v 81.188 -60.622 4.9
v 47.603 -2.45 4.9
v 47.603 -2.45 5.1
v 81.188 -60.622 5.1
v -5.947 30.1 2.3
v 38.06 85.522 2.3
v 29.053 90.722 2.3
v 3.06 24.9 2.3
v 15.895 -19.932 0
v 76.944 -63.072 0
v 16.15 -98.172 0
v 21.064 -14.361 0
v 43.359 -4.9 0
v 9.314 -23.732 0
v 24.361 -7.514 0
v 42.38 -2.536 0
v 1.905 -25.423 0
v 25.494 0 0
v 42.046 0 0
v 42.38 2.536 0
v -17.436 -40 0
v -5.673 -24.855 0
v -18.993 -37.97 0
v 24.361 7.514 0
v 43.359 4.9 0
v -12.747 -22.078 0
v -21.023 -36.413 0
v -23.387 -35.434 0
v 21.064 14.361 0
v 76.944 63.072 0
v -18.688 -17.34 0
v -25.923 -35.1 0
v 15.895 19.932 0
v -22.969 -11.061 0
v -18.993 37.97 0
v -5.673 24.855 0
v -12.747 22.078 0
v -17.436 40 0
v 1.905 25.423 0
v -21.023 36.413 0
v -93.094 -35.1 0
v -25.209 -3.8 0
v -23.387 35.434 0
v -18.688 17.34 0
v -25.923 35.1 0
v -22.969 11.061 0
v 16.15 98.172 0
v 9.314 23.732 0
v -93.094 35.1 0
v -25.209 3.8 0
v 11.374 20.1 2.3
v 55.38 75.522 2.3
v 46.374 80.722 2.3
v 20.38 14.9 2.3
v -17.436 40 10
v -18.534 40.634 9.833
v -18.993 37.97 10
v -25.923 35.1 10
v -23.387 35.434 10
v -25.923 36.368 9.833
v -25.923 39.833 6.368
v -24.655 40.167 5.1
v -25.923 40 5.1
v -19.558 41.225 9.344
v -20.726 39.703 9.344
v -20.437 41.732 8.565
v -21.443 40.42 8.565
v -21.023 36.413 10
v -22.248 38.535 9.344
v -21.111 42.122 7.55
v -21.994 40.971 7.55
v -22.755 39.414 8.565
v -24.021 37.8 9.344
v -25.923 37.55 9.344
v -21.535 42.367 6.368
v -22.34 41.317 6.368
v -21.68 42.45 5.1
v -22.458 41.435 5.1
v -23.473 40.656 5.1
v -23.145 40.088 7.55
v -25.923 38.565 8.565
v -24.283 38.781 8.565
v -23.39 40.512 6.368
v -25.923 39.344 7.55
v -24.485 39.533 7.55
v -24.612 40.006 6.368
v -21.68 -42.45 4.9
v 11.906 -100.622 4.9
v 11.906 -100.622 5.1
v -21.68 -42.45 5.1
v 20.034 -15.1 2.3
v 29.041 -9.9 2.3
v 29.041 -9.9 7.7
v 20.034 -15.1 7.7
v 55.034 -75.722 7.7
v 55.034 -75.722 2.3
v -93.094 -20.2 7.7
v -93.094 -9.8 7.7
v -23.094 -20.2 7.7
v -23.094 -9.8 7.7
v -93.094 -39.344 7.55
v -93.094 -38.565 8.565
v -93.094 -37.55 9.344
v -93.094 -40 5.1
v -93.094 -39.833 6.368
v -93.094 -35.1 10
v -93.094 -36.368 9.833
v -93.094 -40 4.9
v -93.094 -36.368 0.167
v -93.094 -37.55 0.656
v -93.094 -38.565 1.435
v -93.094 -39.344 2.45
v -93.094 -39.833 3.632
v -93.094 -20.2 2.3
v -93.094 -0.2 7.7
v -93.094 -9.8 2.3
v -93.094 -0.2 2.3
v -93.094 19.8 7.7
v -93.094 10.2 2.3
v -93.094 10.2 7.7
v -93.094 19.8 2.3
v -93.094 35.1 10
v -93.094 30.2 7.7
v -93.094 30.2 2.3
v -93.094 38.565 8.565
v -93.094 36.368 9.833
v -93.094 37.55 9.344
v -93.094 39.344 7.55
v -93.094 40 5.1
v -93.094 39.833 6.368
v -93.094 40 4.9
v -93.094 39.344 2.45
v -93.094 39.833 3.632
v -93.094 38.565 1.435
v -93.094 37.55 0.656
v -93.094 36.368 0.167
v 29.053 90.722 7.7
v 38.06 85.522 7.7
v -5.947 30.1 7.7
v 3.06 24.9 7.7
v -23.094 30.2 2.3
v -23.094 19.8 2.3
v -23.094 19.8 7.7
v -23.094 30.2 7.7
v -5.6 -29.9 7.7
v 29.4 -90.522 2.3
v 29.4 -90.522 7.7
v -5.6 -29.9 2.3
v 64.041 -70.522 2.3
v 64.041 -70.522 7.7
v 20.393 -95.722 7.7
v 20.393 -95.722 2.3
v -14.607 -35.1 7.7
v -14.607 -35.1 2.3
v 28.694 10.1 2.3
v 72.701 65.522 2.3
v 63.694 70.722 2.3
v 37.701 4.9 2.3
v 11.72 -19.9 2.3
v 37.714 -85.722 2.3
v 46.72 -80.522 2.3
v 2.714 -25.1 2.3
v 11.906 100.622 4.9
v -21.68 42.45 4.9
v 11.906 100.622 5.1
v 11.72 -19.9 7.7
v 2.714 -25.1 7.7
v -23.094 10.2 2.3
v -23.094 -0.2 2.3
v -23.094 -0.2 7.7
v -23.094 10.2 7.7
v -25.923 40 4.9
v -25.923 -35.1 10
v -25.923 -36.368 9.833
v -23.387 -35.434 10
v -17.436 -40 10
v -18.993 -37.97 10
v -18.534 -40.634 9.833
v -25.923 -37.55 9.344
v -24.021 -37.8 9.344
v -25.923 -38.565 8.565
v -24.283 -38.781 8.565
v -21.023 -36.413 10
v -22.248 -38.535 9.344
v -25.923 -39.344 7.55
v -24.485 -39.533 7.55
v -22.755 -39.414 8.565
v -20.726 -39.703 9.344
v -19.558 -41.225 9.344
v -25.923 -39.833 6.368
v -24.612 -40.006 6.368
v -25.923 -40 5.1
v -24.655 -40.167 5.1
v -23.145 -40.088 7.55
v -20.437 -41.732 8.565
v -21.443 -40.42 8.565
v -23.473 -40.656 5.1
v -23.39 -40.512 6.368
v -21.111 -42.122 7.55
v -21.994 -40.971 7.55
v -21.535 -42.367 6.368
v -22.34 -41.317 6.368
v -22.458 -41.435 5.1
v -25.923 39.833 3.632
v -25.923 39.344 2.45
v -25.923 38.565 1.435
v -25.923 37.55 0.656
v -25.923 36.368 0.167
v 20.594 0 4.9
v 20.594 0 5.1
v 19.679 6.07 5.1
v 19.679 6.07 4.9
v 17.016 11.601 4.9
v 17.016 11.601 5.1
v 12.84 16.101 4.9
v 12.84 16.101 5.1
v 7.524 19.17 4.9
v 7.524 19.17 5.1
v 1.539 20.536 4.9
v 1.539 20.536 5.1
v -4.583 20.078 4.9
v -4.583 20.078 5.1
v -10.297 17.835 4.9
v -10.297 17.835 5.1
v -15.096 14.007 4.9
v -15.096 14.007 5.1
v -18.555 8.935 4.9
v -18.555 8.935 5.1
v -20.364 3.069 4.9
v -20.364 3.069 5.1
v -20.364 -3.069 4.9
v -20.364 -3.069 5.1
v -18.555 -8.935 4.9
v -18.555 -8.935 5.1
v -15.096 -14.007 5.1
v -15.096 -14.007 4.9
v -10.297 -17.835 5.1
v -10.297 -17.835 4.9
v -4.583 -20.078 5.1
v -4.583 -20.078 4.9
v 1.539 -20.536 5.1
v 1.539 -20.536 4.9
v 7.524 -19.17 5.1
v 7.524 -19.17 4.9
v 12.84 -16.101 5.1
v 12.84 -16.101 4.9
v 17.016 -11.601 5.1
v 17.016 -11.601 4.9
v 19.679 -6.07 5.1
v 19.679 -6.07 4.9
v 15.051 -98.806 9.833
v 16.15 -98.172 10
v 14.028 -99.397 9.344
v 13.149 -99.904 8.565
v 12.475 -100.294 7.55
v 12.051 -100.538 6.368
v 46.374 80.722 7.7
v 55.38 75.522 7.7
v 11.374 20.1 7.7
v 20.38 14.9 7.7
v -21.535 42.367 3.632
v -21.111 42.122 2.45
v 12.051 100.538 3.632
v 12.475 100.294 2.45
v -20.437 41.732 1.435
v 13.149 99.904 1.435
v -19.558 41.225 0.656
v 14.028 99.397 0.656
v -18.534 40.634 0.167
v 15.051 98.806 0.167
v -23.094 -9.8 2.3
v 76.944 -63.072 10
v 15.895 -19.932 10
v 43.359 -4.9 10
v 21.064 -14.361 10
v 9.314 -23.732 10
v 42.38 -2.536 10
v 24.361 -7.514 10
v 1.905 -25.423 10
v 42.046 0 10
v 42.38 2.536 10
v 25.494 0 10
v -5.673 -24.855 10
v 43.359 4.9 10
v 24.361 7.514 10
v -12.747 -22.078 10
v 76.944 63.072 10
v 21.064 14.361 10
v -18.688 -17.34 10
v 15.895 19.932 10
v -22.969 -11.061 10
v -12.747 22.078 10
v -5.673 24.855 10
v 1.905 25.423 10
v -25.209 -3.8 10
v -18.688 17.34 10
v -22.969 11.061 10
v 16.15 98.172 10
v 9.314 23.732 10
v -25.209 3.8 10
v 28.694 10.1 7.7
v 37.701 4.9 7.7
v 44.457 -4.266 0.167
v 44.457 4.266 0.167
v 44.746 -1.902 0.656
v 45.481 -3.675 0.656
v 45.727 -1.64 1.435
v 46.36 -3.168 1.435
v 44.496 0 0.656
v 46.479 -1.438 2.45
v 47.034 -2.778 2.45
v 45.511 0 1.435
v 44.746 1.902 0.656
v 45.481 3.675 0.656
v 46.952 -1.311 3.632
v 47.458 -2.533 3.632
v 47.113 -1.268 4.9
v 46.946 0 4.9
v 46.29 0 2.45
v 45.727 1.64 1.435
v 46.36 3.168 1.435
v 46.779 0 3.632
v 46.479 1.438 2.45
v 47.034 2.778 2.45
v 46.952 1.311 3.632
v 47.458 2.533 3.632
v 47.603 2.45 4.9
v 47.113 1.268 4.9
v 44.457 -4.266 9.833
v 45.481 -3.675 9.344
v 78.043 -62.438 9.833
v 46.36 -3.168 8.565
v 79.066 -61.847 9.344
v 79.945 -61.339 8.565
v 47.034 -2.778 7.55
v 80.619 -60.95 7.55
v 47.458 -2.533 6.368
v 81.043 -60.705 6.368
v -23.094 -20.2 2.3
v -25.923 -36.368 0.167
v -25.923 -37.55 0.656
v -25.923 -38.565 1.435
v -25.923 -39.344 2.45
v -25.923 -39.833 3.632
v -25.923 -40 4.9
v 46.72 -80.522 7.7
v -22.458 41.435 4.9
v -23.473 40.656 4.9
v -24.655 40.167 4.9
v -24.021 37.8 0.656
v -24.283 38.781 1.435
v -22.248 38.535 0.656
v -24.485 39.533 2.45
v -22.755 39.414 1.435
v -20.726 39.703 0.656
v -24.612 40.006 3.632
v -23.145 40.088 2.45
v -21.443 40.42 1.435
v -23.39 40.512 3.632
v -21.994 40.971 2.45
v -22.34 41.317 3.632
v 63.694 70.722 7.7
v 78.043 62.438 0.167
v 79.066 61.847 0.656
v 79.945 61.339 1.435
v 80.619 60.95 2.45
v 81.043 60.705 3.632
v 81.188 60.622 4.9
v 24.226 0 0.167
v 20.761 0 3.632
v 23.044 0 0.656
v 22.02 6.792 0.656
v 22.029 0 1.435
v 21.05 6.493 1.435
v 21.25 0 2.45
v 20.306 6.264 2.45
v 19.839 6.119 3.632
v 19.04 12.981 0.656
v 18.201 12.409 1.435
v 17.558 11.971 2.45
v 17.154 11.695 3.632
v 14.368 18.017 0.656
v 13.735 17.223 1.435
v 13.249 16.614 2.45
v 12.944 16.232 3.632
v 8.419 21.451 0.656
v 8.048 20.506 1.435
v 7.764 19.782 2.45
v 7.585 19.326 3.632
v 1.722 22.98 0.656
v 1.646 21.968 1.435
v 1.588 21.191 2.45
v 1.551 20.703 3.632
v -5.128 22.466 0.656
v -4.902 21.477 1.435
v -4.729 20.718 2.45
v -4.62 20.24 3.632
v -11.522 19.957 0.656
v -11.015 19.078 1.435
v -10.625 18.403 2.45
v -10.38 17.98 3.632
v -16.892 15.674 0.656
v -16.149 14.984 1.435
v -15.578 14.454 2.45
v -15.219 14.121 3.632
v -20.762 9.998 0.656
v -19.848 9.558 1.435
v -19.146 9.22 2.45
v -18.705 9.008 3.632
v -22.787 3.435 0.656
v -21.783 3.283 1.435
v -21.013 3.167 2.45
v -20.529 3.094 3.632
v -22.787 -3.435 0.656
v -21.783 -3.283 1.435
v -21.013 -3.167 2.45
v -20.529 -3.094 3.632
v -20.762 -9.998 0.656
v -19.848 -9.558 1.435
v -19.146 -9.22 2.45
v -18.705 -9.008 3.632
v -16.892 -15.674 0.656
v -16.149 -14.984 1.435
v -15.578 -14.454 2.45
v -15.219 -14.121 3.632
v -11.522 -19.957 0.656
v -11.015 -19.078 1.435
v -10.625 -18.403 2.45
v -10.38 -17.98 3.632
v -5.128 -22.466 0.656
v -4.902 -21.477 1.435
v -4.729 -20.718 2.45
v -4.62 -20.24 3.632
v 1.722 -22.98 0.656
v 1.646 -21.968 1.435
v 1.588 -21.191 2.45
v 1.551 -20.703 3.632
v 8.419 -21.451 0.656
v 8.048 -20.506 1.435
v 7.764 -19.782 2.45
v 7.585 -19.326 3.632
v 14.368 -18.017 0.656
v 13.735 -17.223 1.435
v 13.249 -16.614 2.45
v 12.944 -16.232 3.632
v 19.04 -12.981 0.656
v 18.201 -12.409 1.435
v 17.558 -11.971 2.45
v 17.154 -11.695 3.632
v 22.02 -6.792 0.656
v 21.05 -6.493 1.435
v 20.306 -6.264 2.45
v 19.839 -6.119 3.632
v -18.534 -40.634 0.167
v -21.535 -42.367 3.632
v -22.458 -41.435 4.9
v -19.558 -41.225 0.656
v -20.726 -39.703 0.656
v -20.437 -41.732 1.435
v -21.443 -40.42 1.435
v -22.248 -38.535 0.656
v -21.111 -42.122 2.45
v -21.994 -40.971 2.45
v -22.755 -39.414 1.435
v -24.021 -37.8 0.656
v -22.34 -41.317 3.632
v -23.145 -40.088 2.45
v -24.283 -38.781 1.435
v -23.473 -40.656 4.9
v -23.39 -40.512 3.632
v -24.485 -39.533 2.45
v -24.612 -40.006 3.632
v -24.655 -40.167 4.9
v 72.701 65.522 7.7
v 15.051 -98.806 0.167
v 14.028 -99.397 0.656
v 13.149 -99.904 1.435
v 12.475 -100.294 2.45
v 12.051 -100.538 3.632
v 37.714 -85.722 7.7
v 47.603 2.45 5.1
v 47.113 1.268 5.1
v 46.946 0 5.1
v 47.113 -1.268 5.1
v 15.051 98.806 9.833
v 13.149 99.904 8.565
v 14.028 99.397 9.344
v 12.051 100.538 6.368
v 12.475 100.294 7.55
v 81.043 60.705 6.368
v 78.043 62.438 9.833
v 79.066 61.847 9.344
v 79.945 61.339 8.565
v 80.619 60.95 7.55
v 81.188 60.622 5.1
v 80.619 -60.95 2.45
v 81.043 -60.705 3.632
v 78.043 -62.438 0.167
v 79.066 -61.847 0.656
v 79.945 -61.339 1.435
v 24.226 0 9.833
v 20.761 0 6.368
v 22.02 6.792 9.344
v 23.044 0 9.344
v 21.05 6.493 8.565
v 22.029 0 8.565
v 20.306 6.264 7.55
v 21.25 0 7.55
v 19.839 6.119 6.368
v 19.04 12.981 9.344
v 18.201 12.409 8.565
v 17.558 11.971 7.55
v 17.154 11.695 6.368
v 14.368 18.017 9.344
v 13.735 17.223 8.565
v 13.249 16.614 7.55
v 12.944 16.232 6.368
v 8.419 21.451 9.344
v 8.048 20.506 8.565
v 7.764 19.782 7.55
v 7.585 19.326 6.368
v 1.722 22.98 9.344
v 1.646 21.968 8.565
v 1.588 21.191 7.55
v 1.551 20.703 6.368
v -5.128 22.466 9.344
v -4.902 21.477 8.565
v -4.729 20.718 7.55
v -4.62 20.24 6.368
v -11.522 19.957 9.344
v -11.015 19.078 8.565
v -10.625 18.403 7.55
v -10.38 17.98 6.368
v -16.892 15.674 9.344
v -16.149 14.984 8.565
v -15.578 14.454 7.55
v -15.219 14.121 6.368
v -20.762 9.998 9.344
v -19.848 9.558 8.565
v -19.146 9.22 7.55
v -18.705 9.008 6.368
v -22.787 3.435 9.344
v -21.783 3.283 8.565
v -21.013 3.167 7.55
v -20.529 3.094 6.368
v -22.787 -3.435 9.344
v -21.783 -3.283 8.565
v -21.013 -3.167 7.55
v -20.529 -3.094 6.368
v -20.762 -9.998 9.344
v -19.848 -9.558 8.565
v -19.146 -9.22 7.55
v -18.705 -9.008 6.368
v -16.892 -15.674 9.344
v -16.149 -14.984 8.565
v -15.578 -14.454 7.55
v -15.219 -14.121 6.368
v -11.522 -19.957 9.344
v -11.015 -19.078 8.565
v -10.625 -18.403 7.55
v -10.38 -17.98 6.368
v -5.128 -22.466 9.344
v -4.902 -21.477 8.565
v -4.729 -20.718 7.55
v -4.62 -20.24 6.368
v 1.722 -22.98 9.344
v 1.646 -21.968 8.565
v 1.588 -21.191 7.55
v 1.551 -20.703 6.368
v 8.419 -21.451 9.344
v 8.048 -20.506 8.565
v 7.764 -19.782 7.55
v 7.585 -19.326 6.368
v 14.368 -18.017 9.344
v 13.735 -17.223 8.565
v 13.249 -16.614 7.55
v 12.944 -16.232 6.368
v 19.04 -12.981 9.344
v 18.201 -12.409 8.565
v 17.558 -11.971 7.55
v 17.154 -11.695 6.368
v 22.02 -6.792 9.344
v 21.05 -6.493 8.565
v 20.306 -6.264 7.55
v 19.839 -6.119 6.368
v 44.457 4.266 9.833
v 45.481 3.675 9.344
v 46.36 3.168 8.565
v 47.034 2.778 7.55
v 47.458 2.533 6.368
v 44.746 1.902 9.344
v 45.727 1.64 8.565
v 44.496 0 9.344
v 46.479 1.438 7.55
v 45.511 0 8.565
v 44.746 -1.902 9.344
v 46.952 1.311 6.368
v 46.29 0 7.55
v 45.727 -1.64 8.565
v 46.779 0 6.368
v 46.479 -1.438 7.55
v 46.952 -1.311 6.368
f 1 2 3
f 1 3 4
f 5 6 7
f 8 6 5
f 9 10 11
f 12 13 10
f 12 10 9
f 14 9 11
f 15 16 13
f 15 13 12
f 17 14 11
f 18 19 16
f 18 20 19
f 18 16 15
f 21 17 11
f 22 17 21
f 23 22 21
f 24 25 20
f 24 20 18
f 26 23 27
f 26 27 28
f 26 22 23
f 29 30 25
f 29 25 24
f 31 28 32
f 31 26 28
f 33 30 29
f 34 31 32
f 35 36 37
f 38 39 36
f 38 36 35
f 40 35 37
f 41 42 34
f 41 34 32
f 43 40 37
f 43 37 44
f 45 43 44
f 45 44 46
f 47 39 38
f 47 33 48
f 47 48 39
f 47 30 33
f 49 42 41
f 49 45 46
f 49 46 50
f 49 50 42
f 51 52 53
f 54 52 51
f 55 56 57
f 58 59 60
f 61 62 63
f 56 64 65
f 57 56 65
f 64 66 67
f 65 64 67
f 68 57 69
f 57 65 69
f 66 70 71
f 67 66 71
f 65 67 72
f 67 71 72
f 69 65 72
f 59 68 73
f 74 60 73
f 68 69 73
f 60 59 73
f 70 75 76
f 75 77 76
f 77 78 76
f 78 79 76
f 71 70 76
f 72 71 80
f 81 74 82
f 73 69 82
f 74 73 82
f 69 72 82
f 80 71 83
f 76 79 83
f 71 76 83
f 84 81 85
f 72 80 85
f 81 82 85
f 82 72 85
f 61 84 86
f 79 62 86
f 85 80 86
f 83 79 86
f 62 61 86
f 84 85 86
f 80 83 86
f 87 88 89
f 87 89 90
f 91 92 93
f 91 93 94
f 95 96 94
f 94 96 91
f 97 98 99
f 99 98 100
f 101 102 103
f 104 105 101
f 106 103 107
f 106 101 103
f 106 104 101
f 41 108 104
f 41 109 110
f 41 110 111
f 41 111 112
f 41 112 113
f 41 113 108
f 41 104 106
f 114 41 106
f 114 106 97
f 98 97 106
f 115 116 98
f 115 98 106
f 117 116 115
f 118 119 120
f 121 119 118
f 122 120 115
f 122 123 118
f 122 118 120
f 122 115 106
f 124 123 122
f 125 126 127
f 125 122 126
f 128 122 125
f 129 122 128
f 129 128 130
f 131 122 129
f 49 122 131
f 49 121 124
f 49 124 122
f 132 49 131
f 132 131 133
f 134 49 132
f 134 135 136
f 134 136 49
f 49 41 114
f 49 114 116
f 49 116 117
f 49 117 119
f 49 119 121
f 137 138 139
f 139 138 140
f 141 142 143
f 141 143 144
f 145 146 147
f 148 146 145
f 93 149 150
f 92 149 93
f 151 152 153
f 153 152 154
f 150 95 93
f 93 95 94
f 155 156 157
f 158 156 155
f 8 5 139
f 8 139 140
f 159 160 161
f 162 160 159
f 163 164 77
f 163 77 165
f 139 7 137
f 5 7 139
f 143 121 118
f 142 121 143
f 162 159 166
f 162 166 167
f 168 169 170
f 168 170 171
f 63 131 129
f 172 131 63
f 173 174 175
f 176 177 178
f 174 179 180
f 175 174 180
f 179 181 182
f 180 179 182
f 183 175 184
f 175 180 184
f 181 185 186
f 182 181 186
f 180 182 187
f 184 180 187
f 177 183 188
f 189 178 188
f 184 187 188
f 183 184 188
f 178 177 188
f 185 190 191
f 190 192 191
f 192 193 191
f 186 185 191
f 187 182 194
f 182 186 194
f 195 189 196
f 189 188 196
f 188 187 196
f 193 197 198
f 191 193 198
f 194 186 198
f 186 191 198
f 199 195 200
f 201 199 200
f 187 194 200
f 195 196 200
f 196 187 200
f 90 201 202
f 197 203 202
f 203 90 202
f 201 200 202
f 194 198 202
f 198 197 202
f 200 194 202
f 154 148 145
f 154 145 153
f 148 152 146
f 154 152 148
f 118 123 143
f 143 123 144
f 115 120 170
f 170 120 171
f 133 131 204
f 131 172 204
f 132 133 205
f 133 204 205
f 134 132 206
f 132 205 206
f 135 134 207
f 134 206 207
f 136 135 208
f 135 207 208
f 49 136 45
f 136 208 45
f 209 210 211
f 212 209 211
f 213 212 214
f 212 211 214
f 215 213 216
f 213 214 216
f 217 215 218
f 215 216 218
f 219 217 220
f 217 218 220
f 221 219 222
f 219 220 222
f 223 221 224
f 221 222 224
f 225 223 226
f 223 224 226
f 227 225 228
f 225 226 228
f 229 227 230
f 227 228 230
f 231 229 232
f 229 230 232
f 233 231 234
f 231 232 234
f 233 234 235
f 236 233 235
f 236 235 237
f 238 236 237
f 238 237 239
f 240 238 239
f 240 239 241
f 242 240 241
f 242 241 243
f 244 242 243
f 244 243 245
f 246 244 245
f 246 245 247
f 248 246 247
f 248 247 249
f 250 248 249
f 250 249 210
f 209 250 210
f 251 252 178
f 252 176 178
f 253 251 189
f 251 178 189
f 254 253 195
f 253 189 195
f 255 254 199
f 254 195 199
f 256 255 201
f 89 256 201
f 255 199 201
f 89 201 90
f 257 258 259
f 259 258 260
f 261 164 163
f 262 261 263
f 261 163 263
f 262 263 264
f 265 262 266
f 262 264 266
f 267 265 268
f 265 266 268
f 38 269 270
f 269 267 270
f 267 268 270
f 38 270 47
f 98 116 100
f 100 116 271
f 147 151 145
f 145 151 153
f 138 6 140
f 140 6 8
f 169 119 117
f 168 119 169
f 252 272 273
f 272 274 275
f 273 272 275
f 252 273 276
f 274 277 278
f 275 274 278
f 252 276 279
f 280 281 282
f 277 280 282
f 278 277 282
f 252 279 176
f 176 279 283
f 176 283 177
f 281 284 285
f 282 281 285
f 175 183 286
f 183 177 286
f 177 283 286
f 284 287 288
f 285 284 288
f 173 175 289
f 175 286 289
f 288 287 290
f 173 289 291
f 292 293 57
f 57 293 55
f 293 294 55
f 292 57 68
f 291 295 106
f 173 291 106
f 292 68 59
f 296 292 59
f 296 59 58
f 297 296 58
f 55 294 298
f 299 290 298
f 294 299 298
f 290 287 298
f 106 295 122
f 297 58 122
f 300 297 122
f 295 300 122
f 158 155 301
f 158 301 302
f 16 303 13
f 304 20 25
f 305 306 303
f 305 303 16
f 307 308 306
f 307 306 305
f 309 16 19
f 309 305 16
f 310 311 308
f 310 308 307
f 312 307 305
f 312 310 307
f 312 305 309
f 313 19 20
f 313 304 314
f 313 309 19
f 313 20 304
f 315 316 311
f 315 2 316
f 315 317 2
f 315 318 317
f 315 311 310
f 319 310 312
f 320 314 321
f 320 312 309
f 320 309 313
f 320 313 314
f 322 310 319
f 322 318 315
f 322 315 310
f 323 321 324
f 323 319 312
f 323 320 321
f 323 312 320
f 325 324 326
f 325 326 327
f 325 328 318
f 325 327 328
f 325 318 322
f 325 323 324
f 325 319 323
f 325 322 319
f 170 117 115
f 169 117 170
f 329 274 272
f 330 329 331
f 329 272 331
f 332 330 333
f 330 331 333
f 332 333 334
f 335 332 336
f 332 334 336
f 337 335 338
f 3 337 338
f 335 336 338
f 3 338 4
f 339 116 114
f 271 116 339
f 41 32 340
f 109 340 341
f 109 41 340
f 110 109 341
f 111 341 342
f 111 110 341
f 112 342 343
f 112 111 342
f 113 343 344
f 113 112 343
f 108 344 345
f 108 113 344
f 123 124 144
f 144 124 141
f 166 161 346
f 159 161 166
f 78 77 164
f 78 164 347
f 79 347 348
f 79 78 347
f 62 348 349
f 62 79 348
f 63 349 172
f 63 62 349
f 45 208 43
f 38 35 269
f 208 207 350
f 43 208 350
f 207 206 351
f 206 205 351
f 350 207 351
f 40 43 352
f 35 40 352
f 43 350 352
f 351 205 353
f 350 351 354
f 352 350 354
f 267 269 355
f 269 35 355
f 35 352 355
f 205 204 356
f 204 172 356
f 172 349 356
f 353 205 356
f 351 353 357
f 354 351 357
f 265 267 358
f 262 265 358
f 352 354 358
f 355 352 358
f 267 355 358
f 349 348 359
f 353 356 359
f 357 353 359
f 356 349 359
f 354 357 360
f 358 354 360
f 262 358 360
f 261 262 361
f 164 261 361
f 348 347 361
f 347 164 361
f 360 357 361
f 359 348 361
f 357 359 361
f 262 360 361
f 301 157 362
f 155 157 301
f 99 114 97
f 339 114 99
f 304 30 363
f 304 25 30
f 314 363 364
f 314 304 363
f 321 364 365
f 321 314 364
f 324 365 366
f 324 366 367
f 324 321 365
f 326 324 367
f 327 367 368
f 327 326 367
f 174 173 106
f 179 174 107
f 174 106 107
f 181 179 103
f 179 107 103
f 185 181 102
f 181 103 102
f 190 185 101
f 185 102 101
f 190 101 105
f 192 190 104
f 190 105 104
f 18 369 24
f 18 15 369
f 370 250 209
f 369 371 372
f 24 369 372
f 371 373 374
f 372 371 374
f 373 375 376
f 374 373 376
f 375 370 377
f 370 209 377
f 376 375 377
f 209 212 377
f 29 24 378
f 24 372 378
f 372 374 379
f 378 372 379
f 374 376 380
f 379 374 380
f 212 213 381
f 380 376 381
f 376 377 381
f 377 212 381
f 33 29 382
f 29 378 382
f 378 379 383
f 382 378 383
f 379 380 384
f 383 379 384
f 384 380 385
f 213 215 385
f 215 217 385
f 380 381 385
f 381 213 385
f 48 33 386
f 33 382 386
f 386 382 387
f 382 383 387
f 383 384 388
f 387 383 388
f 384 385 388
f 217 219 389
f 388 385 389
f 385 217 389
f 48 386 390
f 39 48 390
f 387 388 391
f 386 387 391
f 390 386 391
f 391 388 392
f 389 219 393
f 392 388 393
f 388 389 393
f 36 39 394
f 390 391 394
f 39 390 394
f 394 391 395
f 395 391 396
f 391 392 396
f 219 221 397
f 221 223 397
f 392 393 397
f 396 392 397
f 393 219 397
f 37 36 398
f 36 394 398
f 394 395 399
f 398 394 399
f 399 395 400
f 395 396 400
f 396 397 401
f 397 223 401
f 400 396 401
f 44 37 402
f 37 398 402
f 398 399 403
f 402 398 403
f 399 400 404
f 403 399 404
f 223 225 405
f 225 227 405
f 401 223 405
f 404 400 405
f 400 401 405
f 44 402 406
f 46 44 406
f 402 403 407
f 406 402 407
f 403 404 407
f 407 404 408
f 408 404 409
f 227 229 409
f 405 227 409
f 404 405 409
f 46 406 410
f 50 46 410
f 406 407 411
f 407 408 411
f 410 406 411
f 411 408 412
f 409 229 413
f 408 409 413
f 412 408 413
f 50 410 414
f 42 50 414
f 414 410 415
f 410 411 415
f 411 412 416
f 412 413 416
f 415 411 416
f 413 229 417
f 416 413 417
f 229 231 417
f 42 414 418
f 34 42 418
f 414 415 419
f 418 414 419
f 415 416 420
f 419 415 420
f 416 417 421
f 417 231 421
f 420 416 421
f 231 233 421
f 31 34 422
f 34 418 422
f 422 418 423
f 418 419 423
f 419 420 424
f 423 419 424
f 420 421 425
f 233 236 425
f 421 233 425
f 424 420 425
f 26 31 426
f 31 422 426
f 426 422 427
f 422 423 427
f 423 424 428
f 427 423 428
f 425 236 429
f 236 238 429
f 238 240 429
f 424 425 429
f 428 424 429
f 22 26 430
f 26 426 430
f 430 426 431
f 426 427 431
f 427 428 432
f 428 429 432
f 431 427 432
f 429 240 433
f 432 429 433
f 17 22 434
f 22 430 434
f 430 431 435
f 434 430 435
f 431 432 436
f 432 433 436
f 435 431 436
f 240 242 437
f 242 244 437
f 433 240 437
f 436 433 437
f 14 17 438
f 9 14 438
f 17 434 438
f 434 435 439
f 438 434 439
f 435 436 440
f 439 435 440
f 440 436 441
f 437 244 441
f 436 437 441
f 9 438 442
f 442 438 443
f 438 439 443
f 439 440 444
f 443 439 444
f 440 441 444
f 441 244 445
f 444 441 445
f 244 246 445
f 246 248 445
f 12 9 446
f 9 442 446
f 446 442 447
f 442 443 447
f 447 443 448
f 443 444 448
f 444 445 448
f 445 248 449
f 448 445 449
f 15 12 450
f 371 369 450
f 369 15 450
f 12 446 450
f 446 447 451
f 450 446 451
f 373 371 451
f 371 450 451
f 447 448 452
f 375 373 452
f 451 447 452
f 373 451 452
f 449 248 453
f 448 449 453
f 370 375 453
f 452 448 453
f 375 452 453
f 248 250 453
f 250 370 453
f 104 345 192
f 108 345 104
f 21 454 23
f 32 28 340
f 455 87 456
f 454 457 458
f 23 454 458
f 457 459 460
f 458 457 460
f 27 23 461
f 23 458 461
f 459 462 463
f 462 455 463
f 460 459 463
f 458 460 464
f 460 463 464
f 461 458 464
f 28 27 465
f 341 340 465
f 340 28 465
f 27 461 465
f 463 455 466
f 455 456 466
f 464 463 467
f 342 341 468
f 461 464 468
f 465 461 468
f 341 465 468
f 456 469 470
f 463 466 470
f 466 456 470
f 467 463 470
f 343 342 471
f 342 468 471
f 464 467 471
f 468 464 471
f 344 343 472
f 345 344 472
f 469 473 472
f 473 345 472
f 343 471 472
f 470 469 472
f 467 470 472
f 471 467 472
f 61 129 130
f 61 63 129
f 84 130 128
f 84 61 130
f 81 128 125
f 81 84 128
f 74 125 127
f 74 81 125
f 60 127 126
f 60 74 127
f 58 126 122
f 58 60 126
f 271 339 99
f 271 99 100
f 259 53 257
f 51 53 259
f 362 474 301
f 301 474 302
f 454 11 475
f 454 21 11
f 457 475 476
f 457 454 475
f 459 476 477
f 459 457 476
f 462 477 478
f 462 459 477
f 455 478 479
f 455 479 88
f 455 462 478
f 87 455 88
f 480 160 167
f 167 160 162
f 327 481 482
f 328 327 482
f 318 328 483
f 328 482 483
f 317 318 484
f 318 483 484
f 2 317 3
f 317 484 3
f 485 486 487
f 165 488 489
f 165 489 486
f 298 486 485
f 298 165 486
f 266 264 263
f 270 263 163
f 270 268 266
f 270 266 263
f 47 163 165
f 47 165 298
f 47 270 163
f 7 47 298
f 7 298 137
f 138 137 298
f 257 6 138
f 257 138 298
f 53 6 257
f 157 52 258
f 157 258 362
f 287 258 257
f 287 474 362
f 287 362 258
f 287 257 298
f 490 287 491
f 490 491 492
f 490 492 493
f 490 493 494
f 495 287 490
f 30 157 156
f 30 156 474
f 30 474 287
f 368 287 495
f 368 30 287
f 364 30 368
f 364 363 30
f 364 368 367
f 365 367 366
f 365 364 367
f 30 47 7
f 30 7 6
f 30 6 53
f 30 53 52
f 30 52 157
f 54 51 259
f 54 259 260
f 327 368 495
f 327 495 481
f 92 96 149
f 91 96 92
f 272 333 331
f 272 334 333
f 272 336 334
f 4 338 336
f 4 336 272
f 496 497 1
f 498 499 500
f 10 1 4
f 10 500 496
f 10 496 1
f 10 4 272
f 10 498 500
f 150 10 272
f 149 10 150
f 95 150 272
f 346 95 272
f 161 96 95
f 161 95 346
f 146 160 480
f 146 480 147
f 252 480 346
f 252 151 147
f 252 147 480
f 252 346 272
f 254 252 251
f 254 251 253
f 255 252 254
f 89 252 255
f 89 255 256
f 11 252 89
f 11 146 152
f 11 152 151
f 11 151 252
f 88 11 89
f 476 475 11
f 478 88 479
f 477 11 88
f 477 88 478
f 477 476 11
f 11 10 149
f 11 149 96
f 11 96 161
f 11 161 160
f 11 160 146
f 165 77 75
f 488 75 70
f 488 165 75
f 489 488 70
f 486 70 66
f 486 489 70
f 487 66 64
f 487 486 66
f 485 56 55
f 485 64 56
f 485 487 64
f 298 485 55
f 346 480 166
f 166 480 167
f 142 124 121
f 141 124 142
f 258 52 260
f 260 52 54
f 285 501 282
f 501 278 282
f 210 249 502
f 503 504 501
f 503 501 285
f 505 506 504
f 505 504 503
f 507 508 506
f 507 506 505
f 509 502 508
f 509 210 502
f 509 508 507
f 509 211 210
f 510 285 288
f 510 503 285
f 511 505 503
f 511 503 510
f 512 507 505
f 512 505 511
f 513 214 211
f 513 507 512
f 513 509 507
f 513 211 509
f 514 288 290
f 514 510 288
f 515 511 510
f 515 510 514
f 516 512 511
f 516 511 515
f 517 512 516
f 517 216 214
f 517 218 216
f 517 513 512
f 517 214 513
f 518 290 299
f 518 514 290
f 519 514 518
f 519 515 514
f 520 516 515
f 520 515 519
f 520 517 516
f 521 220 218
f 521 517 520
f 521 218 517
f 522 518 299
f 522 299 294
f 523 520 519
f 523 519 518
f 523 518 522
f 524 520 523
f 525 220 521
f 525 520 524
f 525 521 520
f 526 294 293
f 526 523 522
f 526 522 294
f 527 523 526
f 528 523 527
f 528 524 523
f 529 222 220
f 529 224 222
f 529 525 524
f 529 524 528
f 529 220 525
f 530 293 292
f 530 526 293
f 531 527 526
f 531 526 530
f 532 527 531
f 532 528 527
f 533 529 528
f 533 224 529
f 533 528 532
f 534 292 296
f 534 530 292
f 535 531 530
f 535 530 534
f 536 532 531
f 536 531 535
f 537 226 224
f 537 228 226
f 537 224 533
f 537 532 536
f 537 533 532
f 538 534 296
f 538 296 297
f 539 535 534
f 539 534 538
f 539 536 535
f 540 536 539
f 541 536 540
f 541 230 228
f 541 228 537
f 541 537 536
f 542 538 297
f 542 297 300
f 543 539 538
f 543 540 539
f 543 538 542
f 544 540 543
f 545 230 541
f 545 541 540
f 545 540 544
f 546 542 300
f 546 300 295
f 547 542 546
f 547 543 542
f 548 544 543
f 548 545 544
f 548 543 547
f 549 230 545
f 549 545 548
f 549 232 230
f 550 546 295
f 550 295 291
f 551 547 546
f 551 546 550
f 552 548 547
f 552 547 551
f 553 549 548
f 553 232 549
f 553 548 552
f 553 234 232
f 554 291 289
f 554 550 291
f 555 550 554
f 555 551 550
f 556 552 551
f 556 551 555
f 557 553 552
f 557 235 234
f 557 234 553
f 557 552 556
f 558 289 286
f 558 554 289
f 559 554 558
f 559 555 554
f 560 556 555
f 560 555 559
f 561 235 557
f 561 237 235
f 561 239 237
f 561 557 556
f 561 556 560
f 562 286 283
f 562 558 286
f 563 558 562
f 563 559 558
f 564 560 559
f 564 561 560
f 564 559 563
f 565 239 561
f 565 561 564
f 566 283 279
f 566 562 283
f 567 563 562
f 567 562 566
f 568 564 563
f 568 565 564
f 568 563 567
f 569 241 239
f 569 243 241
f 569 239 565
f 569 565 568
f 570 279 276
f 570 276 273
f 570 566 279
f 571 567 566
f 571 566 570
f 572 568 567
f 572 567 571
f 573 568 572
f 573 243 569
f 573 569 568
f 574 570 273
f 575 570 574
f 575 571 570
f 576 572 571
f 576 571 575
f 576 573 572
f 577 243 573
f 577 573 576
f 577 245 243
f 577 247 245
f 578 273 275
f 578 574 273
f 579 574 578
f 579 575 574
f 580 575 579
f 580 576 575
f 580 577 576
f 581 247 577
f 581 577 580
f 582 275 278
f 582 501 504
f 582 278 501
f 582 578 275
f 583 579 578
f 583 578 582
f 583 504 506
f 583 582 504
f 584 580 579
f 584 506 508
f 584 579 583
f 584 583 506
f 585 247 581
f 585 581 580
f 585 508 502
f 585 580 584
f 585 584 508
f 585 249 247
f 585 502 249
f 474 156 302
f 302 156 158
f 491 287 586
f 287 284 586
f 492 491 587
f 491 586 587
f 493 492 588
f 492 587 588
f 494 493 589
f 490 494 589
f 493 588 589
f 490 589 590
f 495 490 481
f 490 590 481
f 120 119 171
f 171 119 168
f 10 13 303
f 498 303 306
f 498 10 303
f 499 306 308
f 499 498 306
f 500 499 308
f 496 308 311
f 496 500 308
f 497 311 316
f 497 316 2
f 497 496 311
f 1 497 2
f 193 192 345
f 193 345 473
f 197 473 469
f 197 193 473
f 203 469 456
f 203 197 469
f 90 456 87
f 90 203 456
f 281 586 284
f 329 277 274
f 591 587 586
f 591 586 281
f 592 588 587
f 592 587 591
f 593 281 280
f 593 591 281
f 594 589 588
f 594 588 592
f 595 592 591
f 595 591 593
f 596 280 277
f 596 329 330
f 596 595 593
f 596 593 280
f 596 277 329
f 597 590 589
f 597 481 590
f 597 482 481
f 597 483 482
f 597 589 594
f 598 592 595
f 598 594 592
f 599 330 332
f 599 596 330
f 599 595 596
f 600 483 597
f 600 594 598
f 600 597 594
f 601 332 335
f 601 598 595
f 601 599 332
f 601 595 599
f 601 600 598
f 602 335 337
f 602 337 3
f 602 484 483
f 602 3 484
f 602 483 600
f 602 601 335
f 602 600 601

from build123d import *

# Parameters (mm, degrees)
BOX001_W         = 70
BOX001_H         = 10.4
BOX001_DEPTH     = 5.4
ARRAY001_Y_COUNT = 3
ARRAY001_Y_PITCH = 20
ARRAY002_COUNT   = 3
PAD_DEPTH        = 10
SKETCH001_R      = 20.594011
POCKET_DEPTH     = 10.001
FILLET003_R      = 4.9
FILLET004_R      = 4.9


with BuildPart() as array002:
    # Box001 → Box001 (new body)
    with BuildSketch(Plane(origin=(-93.094011, 19.8, 2.3), x_dir=(1, 0, 0), z_dir=(0, 0, 1))):
        with Locations((35, 5.2)):
            Rectangle(BOX001_W, BOX001_H)
    extrude(amount=BOX001_DEPTH)

    # Array001 Y: Array002 ×3


with BuildPart() as array002_1:
    add(array002.part)
    with Locations(*[(0, -i * ARRAY001_Y_PITCH, 0) for i in range(1, ARRAY001_Y_COUNT)]):
        add(array002.part)

    # Array002: Array002 ×3 about axis
    array002_axis = Axis((0, 0, 0), (0, 0, 1))


with BuildPart() as array002_2:
    add(array002_1.part)
    for i in range(1, ARRAY002_COUNT):
        add(array002_1.part.rotate(array002_axis, i * 360 / ARRAY002_COUNT))


with BuildPart() as innerjoinerbase:
    # Sketch (on XY_Plane of Origin) → Pad (new body)
    with BuildSketch(Plane.XY):
        Polygon((-23.094011, 40), (11.905989, 100.621778), (81.188022, 60.621778), (46.188022, 0), (81.188022, -60.621778), (11.905989, -100.621778), (-23.094011, -40), (-93.094011, -40), (-93.094011, 40), align=None)
    extrude(amount=PAD_DEPTH)

    # Sketch001 (on Face11 of Pad) → Pocket (cut, through all)
    with BuildSketch(Plane.XY.offset(10)):
        Circle(SKETCH001_R)
    extrude(amount=-POCKET_DEPTH, mode=Mode.SUBTRACT)

    # Fillet003
    fillet003_edges = [innerjoinerbase.edges().sort_by_distance(p)[0] for p in [
        (-5.594011, -70.310889, 0),
        (-58.094011, -40, 0),
        (-58.094011, -40, 10),
        (-5.594011, -70.310889, 10),
        (-58.094011, 40, 0),
        (-5.594011, 70.310889, 0),
        (-5.594011, 70.310889, 10),
        (-58.094011, 40, 10),
        (63.688022, 30.310889, 10),
        (63.688022, -30.310889, 10),
        (63.688022, -30.310889, 0),
        (63.688022, 30.310889, 0),
        (-23.094011, -40, 5),
        (46.188022, 0, 5),
        (-23.094011, 40, 5),
    ]]
    fillet(fillet003_edges, radius=FILLET003_R)

    # Fillet004
    fillet004_edges = [innerjoinerbase.edges().sort_by_distance(p)[0] for p in [
        (-20.594011, 0, 0),
        (-20.594011, 0, 10),
    ]]
    fillet(fillet004_edges, radius=FILLET004_R)

    # Cut: cut Array002
    add(array002_2.part, mode=Mode.SUBTRACT)


solid = innerjoinerbase.part
